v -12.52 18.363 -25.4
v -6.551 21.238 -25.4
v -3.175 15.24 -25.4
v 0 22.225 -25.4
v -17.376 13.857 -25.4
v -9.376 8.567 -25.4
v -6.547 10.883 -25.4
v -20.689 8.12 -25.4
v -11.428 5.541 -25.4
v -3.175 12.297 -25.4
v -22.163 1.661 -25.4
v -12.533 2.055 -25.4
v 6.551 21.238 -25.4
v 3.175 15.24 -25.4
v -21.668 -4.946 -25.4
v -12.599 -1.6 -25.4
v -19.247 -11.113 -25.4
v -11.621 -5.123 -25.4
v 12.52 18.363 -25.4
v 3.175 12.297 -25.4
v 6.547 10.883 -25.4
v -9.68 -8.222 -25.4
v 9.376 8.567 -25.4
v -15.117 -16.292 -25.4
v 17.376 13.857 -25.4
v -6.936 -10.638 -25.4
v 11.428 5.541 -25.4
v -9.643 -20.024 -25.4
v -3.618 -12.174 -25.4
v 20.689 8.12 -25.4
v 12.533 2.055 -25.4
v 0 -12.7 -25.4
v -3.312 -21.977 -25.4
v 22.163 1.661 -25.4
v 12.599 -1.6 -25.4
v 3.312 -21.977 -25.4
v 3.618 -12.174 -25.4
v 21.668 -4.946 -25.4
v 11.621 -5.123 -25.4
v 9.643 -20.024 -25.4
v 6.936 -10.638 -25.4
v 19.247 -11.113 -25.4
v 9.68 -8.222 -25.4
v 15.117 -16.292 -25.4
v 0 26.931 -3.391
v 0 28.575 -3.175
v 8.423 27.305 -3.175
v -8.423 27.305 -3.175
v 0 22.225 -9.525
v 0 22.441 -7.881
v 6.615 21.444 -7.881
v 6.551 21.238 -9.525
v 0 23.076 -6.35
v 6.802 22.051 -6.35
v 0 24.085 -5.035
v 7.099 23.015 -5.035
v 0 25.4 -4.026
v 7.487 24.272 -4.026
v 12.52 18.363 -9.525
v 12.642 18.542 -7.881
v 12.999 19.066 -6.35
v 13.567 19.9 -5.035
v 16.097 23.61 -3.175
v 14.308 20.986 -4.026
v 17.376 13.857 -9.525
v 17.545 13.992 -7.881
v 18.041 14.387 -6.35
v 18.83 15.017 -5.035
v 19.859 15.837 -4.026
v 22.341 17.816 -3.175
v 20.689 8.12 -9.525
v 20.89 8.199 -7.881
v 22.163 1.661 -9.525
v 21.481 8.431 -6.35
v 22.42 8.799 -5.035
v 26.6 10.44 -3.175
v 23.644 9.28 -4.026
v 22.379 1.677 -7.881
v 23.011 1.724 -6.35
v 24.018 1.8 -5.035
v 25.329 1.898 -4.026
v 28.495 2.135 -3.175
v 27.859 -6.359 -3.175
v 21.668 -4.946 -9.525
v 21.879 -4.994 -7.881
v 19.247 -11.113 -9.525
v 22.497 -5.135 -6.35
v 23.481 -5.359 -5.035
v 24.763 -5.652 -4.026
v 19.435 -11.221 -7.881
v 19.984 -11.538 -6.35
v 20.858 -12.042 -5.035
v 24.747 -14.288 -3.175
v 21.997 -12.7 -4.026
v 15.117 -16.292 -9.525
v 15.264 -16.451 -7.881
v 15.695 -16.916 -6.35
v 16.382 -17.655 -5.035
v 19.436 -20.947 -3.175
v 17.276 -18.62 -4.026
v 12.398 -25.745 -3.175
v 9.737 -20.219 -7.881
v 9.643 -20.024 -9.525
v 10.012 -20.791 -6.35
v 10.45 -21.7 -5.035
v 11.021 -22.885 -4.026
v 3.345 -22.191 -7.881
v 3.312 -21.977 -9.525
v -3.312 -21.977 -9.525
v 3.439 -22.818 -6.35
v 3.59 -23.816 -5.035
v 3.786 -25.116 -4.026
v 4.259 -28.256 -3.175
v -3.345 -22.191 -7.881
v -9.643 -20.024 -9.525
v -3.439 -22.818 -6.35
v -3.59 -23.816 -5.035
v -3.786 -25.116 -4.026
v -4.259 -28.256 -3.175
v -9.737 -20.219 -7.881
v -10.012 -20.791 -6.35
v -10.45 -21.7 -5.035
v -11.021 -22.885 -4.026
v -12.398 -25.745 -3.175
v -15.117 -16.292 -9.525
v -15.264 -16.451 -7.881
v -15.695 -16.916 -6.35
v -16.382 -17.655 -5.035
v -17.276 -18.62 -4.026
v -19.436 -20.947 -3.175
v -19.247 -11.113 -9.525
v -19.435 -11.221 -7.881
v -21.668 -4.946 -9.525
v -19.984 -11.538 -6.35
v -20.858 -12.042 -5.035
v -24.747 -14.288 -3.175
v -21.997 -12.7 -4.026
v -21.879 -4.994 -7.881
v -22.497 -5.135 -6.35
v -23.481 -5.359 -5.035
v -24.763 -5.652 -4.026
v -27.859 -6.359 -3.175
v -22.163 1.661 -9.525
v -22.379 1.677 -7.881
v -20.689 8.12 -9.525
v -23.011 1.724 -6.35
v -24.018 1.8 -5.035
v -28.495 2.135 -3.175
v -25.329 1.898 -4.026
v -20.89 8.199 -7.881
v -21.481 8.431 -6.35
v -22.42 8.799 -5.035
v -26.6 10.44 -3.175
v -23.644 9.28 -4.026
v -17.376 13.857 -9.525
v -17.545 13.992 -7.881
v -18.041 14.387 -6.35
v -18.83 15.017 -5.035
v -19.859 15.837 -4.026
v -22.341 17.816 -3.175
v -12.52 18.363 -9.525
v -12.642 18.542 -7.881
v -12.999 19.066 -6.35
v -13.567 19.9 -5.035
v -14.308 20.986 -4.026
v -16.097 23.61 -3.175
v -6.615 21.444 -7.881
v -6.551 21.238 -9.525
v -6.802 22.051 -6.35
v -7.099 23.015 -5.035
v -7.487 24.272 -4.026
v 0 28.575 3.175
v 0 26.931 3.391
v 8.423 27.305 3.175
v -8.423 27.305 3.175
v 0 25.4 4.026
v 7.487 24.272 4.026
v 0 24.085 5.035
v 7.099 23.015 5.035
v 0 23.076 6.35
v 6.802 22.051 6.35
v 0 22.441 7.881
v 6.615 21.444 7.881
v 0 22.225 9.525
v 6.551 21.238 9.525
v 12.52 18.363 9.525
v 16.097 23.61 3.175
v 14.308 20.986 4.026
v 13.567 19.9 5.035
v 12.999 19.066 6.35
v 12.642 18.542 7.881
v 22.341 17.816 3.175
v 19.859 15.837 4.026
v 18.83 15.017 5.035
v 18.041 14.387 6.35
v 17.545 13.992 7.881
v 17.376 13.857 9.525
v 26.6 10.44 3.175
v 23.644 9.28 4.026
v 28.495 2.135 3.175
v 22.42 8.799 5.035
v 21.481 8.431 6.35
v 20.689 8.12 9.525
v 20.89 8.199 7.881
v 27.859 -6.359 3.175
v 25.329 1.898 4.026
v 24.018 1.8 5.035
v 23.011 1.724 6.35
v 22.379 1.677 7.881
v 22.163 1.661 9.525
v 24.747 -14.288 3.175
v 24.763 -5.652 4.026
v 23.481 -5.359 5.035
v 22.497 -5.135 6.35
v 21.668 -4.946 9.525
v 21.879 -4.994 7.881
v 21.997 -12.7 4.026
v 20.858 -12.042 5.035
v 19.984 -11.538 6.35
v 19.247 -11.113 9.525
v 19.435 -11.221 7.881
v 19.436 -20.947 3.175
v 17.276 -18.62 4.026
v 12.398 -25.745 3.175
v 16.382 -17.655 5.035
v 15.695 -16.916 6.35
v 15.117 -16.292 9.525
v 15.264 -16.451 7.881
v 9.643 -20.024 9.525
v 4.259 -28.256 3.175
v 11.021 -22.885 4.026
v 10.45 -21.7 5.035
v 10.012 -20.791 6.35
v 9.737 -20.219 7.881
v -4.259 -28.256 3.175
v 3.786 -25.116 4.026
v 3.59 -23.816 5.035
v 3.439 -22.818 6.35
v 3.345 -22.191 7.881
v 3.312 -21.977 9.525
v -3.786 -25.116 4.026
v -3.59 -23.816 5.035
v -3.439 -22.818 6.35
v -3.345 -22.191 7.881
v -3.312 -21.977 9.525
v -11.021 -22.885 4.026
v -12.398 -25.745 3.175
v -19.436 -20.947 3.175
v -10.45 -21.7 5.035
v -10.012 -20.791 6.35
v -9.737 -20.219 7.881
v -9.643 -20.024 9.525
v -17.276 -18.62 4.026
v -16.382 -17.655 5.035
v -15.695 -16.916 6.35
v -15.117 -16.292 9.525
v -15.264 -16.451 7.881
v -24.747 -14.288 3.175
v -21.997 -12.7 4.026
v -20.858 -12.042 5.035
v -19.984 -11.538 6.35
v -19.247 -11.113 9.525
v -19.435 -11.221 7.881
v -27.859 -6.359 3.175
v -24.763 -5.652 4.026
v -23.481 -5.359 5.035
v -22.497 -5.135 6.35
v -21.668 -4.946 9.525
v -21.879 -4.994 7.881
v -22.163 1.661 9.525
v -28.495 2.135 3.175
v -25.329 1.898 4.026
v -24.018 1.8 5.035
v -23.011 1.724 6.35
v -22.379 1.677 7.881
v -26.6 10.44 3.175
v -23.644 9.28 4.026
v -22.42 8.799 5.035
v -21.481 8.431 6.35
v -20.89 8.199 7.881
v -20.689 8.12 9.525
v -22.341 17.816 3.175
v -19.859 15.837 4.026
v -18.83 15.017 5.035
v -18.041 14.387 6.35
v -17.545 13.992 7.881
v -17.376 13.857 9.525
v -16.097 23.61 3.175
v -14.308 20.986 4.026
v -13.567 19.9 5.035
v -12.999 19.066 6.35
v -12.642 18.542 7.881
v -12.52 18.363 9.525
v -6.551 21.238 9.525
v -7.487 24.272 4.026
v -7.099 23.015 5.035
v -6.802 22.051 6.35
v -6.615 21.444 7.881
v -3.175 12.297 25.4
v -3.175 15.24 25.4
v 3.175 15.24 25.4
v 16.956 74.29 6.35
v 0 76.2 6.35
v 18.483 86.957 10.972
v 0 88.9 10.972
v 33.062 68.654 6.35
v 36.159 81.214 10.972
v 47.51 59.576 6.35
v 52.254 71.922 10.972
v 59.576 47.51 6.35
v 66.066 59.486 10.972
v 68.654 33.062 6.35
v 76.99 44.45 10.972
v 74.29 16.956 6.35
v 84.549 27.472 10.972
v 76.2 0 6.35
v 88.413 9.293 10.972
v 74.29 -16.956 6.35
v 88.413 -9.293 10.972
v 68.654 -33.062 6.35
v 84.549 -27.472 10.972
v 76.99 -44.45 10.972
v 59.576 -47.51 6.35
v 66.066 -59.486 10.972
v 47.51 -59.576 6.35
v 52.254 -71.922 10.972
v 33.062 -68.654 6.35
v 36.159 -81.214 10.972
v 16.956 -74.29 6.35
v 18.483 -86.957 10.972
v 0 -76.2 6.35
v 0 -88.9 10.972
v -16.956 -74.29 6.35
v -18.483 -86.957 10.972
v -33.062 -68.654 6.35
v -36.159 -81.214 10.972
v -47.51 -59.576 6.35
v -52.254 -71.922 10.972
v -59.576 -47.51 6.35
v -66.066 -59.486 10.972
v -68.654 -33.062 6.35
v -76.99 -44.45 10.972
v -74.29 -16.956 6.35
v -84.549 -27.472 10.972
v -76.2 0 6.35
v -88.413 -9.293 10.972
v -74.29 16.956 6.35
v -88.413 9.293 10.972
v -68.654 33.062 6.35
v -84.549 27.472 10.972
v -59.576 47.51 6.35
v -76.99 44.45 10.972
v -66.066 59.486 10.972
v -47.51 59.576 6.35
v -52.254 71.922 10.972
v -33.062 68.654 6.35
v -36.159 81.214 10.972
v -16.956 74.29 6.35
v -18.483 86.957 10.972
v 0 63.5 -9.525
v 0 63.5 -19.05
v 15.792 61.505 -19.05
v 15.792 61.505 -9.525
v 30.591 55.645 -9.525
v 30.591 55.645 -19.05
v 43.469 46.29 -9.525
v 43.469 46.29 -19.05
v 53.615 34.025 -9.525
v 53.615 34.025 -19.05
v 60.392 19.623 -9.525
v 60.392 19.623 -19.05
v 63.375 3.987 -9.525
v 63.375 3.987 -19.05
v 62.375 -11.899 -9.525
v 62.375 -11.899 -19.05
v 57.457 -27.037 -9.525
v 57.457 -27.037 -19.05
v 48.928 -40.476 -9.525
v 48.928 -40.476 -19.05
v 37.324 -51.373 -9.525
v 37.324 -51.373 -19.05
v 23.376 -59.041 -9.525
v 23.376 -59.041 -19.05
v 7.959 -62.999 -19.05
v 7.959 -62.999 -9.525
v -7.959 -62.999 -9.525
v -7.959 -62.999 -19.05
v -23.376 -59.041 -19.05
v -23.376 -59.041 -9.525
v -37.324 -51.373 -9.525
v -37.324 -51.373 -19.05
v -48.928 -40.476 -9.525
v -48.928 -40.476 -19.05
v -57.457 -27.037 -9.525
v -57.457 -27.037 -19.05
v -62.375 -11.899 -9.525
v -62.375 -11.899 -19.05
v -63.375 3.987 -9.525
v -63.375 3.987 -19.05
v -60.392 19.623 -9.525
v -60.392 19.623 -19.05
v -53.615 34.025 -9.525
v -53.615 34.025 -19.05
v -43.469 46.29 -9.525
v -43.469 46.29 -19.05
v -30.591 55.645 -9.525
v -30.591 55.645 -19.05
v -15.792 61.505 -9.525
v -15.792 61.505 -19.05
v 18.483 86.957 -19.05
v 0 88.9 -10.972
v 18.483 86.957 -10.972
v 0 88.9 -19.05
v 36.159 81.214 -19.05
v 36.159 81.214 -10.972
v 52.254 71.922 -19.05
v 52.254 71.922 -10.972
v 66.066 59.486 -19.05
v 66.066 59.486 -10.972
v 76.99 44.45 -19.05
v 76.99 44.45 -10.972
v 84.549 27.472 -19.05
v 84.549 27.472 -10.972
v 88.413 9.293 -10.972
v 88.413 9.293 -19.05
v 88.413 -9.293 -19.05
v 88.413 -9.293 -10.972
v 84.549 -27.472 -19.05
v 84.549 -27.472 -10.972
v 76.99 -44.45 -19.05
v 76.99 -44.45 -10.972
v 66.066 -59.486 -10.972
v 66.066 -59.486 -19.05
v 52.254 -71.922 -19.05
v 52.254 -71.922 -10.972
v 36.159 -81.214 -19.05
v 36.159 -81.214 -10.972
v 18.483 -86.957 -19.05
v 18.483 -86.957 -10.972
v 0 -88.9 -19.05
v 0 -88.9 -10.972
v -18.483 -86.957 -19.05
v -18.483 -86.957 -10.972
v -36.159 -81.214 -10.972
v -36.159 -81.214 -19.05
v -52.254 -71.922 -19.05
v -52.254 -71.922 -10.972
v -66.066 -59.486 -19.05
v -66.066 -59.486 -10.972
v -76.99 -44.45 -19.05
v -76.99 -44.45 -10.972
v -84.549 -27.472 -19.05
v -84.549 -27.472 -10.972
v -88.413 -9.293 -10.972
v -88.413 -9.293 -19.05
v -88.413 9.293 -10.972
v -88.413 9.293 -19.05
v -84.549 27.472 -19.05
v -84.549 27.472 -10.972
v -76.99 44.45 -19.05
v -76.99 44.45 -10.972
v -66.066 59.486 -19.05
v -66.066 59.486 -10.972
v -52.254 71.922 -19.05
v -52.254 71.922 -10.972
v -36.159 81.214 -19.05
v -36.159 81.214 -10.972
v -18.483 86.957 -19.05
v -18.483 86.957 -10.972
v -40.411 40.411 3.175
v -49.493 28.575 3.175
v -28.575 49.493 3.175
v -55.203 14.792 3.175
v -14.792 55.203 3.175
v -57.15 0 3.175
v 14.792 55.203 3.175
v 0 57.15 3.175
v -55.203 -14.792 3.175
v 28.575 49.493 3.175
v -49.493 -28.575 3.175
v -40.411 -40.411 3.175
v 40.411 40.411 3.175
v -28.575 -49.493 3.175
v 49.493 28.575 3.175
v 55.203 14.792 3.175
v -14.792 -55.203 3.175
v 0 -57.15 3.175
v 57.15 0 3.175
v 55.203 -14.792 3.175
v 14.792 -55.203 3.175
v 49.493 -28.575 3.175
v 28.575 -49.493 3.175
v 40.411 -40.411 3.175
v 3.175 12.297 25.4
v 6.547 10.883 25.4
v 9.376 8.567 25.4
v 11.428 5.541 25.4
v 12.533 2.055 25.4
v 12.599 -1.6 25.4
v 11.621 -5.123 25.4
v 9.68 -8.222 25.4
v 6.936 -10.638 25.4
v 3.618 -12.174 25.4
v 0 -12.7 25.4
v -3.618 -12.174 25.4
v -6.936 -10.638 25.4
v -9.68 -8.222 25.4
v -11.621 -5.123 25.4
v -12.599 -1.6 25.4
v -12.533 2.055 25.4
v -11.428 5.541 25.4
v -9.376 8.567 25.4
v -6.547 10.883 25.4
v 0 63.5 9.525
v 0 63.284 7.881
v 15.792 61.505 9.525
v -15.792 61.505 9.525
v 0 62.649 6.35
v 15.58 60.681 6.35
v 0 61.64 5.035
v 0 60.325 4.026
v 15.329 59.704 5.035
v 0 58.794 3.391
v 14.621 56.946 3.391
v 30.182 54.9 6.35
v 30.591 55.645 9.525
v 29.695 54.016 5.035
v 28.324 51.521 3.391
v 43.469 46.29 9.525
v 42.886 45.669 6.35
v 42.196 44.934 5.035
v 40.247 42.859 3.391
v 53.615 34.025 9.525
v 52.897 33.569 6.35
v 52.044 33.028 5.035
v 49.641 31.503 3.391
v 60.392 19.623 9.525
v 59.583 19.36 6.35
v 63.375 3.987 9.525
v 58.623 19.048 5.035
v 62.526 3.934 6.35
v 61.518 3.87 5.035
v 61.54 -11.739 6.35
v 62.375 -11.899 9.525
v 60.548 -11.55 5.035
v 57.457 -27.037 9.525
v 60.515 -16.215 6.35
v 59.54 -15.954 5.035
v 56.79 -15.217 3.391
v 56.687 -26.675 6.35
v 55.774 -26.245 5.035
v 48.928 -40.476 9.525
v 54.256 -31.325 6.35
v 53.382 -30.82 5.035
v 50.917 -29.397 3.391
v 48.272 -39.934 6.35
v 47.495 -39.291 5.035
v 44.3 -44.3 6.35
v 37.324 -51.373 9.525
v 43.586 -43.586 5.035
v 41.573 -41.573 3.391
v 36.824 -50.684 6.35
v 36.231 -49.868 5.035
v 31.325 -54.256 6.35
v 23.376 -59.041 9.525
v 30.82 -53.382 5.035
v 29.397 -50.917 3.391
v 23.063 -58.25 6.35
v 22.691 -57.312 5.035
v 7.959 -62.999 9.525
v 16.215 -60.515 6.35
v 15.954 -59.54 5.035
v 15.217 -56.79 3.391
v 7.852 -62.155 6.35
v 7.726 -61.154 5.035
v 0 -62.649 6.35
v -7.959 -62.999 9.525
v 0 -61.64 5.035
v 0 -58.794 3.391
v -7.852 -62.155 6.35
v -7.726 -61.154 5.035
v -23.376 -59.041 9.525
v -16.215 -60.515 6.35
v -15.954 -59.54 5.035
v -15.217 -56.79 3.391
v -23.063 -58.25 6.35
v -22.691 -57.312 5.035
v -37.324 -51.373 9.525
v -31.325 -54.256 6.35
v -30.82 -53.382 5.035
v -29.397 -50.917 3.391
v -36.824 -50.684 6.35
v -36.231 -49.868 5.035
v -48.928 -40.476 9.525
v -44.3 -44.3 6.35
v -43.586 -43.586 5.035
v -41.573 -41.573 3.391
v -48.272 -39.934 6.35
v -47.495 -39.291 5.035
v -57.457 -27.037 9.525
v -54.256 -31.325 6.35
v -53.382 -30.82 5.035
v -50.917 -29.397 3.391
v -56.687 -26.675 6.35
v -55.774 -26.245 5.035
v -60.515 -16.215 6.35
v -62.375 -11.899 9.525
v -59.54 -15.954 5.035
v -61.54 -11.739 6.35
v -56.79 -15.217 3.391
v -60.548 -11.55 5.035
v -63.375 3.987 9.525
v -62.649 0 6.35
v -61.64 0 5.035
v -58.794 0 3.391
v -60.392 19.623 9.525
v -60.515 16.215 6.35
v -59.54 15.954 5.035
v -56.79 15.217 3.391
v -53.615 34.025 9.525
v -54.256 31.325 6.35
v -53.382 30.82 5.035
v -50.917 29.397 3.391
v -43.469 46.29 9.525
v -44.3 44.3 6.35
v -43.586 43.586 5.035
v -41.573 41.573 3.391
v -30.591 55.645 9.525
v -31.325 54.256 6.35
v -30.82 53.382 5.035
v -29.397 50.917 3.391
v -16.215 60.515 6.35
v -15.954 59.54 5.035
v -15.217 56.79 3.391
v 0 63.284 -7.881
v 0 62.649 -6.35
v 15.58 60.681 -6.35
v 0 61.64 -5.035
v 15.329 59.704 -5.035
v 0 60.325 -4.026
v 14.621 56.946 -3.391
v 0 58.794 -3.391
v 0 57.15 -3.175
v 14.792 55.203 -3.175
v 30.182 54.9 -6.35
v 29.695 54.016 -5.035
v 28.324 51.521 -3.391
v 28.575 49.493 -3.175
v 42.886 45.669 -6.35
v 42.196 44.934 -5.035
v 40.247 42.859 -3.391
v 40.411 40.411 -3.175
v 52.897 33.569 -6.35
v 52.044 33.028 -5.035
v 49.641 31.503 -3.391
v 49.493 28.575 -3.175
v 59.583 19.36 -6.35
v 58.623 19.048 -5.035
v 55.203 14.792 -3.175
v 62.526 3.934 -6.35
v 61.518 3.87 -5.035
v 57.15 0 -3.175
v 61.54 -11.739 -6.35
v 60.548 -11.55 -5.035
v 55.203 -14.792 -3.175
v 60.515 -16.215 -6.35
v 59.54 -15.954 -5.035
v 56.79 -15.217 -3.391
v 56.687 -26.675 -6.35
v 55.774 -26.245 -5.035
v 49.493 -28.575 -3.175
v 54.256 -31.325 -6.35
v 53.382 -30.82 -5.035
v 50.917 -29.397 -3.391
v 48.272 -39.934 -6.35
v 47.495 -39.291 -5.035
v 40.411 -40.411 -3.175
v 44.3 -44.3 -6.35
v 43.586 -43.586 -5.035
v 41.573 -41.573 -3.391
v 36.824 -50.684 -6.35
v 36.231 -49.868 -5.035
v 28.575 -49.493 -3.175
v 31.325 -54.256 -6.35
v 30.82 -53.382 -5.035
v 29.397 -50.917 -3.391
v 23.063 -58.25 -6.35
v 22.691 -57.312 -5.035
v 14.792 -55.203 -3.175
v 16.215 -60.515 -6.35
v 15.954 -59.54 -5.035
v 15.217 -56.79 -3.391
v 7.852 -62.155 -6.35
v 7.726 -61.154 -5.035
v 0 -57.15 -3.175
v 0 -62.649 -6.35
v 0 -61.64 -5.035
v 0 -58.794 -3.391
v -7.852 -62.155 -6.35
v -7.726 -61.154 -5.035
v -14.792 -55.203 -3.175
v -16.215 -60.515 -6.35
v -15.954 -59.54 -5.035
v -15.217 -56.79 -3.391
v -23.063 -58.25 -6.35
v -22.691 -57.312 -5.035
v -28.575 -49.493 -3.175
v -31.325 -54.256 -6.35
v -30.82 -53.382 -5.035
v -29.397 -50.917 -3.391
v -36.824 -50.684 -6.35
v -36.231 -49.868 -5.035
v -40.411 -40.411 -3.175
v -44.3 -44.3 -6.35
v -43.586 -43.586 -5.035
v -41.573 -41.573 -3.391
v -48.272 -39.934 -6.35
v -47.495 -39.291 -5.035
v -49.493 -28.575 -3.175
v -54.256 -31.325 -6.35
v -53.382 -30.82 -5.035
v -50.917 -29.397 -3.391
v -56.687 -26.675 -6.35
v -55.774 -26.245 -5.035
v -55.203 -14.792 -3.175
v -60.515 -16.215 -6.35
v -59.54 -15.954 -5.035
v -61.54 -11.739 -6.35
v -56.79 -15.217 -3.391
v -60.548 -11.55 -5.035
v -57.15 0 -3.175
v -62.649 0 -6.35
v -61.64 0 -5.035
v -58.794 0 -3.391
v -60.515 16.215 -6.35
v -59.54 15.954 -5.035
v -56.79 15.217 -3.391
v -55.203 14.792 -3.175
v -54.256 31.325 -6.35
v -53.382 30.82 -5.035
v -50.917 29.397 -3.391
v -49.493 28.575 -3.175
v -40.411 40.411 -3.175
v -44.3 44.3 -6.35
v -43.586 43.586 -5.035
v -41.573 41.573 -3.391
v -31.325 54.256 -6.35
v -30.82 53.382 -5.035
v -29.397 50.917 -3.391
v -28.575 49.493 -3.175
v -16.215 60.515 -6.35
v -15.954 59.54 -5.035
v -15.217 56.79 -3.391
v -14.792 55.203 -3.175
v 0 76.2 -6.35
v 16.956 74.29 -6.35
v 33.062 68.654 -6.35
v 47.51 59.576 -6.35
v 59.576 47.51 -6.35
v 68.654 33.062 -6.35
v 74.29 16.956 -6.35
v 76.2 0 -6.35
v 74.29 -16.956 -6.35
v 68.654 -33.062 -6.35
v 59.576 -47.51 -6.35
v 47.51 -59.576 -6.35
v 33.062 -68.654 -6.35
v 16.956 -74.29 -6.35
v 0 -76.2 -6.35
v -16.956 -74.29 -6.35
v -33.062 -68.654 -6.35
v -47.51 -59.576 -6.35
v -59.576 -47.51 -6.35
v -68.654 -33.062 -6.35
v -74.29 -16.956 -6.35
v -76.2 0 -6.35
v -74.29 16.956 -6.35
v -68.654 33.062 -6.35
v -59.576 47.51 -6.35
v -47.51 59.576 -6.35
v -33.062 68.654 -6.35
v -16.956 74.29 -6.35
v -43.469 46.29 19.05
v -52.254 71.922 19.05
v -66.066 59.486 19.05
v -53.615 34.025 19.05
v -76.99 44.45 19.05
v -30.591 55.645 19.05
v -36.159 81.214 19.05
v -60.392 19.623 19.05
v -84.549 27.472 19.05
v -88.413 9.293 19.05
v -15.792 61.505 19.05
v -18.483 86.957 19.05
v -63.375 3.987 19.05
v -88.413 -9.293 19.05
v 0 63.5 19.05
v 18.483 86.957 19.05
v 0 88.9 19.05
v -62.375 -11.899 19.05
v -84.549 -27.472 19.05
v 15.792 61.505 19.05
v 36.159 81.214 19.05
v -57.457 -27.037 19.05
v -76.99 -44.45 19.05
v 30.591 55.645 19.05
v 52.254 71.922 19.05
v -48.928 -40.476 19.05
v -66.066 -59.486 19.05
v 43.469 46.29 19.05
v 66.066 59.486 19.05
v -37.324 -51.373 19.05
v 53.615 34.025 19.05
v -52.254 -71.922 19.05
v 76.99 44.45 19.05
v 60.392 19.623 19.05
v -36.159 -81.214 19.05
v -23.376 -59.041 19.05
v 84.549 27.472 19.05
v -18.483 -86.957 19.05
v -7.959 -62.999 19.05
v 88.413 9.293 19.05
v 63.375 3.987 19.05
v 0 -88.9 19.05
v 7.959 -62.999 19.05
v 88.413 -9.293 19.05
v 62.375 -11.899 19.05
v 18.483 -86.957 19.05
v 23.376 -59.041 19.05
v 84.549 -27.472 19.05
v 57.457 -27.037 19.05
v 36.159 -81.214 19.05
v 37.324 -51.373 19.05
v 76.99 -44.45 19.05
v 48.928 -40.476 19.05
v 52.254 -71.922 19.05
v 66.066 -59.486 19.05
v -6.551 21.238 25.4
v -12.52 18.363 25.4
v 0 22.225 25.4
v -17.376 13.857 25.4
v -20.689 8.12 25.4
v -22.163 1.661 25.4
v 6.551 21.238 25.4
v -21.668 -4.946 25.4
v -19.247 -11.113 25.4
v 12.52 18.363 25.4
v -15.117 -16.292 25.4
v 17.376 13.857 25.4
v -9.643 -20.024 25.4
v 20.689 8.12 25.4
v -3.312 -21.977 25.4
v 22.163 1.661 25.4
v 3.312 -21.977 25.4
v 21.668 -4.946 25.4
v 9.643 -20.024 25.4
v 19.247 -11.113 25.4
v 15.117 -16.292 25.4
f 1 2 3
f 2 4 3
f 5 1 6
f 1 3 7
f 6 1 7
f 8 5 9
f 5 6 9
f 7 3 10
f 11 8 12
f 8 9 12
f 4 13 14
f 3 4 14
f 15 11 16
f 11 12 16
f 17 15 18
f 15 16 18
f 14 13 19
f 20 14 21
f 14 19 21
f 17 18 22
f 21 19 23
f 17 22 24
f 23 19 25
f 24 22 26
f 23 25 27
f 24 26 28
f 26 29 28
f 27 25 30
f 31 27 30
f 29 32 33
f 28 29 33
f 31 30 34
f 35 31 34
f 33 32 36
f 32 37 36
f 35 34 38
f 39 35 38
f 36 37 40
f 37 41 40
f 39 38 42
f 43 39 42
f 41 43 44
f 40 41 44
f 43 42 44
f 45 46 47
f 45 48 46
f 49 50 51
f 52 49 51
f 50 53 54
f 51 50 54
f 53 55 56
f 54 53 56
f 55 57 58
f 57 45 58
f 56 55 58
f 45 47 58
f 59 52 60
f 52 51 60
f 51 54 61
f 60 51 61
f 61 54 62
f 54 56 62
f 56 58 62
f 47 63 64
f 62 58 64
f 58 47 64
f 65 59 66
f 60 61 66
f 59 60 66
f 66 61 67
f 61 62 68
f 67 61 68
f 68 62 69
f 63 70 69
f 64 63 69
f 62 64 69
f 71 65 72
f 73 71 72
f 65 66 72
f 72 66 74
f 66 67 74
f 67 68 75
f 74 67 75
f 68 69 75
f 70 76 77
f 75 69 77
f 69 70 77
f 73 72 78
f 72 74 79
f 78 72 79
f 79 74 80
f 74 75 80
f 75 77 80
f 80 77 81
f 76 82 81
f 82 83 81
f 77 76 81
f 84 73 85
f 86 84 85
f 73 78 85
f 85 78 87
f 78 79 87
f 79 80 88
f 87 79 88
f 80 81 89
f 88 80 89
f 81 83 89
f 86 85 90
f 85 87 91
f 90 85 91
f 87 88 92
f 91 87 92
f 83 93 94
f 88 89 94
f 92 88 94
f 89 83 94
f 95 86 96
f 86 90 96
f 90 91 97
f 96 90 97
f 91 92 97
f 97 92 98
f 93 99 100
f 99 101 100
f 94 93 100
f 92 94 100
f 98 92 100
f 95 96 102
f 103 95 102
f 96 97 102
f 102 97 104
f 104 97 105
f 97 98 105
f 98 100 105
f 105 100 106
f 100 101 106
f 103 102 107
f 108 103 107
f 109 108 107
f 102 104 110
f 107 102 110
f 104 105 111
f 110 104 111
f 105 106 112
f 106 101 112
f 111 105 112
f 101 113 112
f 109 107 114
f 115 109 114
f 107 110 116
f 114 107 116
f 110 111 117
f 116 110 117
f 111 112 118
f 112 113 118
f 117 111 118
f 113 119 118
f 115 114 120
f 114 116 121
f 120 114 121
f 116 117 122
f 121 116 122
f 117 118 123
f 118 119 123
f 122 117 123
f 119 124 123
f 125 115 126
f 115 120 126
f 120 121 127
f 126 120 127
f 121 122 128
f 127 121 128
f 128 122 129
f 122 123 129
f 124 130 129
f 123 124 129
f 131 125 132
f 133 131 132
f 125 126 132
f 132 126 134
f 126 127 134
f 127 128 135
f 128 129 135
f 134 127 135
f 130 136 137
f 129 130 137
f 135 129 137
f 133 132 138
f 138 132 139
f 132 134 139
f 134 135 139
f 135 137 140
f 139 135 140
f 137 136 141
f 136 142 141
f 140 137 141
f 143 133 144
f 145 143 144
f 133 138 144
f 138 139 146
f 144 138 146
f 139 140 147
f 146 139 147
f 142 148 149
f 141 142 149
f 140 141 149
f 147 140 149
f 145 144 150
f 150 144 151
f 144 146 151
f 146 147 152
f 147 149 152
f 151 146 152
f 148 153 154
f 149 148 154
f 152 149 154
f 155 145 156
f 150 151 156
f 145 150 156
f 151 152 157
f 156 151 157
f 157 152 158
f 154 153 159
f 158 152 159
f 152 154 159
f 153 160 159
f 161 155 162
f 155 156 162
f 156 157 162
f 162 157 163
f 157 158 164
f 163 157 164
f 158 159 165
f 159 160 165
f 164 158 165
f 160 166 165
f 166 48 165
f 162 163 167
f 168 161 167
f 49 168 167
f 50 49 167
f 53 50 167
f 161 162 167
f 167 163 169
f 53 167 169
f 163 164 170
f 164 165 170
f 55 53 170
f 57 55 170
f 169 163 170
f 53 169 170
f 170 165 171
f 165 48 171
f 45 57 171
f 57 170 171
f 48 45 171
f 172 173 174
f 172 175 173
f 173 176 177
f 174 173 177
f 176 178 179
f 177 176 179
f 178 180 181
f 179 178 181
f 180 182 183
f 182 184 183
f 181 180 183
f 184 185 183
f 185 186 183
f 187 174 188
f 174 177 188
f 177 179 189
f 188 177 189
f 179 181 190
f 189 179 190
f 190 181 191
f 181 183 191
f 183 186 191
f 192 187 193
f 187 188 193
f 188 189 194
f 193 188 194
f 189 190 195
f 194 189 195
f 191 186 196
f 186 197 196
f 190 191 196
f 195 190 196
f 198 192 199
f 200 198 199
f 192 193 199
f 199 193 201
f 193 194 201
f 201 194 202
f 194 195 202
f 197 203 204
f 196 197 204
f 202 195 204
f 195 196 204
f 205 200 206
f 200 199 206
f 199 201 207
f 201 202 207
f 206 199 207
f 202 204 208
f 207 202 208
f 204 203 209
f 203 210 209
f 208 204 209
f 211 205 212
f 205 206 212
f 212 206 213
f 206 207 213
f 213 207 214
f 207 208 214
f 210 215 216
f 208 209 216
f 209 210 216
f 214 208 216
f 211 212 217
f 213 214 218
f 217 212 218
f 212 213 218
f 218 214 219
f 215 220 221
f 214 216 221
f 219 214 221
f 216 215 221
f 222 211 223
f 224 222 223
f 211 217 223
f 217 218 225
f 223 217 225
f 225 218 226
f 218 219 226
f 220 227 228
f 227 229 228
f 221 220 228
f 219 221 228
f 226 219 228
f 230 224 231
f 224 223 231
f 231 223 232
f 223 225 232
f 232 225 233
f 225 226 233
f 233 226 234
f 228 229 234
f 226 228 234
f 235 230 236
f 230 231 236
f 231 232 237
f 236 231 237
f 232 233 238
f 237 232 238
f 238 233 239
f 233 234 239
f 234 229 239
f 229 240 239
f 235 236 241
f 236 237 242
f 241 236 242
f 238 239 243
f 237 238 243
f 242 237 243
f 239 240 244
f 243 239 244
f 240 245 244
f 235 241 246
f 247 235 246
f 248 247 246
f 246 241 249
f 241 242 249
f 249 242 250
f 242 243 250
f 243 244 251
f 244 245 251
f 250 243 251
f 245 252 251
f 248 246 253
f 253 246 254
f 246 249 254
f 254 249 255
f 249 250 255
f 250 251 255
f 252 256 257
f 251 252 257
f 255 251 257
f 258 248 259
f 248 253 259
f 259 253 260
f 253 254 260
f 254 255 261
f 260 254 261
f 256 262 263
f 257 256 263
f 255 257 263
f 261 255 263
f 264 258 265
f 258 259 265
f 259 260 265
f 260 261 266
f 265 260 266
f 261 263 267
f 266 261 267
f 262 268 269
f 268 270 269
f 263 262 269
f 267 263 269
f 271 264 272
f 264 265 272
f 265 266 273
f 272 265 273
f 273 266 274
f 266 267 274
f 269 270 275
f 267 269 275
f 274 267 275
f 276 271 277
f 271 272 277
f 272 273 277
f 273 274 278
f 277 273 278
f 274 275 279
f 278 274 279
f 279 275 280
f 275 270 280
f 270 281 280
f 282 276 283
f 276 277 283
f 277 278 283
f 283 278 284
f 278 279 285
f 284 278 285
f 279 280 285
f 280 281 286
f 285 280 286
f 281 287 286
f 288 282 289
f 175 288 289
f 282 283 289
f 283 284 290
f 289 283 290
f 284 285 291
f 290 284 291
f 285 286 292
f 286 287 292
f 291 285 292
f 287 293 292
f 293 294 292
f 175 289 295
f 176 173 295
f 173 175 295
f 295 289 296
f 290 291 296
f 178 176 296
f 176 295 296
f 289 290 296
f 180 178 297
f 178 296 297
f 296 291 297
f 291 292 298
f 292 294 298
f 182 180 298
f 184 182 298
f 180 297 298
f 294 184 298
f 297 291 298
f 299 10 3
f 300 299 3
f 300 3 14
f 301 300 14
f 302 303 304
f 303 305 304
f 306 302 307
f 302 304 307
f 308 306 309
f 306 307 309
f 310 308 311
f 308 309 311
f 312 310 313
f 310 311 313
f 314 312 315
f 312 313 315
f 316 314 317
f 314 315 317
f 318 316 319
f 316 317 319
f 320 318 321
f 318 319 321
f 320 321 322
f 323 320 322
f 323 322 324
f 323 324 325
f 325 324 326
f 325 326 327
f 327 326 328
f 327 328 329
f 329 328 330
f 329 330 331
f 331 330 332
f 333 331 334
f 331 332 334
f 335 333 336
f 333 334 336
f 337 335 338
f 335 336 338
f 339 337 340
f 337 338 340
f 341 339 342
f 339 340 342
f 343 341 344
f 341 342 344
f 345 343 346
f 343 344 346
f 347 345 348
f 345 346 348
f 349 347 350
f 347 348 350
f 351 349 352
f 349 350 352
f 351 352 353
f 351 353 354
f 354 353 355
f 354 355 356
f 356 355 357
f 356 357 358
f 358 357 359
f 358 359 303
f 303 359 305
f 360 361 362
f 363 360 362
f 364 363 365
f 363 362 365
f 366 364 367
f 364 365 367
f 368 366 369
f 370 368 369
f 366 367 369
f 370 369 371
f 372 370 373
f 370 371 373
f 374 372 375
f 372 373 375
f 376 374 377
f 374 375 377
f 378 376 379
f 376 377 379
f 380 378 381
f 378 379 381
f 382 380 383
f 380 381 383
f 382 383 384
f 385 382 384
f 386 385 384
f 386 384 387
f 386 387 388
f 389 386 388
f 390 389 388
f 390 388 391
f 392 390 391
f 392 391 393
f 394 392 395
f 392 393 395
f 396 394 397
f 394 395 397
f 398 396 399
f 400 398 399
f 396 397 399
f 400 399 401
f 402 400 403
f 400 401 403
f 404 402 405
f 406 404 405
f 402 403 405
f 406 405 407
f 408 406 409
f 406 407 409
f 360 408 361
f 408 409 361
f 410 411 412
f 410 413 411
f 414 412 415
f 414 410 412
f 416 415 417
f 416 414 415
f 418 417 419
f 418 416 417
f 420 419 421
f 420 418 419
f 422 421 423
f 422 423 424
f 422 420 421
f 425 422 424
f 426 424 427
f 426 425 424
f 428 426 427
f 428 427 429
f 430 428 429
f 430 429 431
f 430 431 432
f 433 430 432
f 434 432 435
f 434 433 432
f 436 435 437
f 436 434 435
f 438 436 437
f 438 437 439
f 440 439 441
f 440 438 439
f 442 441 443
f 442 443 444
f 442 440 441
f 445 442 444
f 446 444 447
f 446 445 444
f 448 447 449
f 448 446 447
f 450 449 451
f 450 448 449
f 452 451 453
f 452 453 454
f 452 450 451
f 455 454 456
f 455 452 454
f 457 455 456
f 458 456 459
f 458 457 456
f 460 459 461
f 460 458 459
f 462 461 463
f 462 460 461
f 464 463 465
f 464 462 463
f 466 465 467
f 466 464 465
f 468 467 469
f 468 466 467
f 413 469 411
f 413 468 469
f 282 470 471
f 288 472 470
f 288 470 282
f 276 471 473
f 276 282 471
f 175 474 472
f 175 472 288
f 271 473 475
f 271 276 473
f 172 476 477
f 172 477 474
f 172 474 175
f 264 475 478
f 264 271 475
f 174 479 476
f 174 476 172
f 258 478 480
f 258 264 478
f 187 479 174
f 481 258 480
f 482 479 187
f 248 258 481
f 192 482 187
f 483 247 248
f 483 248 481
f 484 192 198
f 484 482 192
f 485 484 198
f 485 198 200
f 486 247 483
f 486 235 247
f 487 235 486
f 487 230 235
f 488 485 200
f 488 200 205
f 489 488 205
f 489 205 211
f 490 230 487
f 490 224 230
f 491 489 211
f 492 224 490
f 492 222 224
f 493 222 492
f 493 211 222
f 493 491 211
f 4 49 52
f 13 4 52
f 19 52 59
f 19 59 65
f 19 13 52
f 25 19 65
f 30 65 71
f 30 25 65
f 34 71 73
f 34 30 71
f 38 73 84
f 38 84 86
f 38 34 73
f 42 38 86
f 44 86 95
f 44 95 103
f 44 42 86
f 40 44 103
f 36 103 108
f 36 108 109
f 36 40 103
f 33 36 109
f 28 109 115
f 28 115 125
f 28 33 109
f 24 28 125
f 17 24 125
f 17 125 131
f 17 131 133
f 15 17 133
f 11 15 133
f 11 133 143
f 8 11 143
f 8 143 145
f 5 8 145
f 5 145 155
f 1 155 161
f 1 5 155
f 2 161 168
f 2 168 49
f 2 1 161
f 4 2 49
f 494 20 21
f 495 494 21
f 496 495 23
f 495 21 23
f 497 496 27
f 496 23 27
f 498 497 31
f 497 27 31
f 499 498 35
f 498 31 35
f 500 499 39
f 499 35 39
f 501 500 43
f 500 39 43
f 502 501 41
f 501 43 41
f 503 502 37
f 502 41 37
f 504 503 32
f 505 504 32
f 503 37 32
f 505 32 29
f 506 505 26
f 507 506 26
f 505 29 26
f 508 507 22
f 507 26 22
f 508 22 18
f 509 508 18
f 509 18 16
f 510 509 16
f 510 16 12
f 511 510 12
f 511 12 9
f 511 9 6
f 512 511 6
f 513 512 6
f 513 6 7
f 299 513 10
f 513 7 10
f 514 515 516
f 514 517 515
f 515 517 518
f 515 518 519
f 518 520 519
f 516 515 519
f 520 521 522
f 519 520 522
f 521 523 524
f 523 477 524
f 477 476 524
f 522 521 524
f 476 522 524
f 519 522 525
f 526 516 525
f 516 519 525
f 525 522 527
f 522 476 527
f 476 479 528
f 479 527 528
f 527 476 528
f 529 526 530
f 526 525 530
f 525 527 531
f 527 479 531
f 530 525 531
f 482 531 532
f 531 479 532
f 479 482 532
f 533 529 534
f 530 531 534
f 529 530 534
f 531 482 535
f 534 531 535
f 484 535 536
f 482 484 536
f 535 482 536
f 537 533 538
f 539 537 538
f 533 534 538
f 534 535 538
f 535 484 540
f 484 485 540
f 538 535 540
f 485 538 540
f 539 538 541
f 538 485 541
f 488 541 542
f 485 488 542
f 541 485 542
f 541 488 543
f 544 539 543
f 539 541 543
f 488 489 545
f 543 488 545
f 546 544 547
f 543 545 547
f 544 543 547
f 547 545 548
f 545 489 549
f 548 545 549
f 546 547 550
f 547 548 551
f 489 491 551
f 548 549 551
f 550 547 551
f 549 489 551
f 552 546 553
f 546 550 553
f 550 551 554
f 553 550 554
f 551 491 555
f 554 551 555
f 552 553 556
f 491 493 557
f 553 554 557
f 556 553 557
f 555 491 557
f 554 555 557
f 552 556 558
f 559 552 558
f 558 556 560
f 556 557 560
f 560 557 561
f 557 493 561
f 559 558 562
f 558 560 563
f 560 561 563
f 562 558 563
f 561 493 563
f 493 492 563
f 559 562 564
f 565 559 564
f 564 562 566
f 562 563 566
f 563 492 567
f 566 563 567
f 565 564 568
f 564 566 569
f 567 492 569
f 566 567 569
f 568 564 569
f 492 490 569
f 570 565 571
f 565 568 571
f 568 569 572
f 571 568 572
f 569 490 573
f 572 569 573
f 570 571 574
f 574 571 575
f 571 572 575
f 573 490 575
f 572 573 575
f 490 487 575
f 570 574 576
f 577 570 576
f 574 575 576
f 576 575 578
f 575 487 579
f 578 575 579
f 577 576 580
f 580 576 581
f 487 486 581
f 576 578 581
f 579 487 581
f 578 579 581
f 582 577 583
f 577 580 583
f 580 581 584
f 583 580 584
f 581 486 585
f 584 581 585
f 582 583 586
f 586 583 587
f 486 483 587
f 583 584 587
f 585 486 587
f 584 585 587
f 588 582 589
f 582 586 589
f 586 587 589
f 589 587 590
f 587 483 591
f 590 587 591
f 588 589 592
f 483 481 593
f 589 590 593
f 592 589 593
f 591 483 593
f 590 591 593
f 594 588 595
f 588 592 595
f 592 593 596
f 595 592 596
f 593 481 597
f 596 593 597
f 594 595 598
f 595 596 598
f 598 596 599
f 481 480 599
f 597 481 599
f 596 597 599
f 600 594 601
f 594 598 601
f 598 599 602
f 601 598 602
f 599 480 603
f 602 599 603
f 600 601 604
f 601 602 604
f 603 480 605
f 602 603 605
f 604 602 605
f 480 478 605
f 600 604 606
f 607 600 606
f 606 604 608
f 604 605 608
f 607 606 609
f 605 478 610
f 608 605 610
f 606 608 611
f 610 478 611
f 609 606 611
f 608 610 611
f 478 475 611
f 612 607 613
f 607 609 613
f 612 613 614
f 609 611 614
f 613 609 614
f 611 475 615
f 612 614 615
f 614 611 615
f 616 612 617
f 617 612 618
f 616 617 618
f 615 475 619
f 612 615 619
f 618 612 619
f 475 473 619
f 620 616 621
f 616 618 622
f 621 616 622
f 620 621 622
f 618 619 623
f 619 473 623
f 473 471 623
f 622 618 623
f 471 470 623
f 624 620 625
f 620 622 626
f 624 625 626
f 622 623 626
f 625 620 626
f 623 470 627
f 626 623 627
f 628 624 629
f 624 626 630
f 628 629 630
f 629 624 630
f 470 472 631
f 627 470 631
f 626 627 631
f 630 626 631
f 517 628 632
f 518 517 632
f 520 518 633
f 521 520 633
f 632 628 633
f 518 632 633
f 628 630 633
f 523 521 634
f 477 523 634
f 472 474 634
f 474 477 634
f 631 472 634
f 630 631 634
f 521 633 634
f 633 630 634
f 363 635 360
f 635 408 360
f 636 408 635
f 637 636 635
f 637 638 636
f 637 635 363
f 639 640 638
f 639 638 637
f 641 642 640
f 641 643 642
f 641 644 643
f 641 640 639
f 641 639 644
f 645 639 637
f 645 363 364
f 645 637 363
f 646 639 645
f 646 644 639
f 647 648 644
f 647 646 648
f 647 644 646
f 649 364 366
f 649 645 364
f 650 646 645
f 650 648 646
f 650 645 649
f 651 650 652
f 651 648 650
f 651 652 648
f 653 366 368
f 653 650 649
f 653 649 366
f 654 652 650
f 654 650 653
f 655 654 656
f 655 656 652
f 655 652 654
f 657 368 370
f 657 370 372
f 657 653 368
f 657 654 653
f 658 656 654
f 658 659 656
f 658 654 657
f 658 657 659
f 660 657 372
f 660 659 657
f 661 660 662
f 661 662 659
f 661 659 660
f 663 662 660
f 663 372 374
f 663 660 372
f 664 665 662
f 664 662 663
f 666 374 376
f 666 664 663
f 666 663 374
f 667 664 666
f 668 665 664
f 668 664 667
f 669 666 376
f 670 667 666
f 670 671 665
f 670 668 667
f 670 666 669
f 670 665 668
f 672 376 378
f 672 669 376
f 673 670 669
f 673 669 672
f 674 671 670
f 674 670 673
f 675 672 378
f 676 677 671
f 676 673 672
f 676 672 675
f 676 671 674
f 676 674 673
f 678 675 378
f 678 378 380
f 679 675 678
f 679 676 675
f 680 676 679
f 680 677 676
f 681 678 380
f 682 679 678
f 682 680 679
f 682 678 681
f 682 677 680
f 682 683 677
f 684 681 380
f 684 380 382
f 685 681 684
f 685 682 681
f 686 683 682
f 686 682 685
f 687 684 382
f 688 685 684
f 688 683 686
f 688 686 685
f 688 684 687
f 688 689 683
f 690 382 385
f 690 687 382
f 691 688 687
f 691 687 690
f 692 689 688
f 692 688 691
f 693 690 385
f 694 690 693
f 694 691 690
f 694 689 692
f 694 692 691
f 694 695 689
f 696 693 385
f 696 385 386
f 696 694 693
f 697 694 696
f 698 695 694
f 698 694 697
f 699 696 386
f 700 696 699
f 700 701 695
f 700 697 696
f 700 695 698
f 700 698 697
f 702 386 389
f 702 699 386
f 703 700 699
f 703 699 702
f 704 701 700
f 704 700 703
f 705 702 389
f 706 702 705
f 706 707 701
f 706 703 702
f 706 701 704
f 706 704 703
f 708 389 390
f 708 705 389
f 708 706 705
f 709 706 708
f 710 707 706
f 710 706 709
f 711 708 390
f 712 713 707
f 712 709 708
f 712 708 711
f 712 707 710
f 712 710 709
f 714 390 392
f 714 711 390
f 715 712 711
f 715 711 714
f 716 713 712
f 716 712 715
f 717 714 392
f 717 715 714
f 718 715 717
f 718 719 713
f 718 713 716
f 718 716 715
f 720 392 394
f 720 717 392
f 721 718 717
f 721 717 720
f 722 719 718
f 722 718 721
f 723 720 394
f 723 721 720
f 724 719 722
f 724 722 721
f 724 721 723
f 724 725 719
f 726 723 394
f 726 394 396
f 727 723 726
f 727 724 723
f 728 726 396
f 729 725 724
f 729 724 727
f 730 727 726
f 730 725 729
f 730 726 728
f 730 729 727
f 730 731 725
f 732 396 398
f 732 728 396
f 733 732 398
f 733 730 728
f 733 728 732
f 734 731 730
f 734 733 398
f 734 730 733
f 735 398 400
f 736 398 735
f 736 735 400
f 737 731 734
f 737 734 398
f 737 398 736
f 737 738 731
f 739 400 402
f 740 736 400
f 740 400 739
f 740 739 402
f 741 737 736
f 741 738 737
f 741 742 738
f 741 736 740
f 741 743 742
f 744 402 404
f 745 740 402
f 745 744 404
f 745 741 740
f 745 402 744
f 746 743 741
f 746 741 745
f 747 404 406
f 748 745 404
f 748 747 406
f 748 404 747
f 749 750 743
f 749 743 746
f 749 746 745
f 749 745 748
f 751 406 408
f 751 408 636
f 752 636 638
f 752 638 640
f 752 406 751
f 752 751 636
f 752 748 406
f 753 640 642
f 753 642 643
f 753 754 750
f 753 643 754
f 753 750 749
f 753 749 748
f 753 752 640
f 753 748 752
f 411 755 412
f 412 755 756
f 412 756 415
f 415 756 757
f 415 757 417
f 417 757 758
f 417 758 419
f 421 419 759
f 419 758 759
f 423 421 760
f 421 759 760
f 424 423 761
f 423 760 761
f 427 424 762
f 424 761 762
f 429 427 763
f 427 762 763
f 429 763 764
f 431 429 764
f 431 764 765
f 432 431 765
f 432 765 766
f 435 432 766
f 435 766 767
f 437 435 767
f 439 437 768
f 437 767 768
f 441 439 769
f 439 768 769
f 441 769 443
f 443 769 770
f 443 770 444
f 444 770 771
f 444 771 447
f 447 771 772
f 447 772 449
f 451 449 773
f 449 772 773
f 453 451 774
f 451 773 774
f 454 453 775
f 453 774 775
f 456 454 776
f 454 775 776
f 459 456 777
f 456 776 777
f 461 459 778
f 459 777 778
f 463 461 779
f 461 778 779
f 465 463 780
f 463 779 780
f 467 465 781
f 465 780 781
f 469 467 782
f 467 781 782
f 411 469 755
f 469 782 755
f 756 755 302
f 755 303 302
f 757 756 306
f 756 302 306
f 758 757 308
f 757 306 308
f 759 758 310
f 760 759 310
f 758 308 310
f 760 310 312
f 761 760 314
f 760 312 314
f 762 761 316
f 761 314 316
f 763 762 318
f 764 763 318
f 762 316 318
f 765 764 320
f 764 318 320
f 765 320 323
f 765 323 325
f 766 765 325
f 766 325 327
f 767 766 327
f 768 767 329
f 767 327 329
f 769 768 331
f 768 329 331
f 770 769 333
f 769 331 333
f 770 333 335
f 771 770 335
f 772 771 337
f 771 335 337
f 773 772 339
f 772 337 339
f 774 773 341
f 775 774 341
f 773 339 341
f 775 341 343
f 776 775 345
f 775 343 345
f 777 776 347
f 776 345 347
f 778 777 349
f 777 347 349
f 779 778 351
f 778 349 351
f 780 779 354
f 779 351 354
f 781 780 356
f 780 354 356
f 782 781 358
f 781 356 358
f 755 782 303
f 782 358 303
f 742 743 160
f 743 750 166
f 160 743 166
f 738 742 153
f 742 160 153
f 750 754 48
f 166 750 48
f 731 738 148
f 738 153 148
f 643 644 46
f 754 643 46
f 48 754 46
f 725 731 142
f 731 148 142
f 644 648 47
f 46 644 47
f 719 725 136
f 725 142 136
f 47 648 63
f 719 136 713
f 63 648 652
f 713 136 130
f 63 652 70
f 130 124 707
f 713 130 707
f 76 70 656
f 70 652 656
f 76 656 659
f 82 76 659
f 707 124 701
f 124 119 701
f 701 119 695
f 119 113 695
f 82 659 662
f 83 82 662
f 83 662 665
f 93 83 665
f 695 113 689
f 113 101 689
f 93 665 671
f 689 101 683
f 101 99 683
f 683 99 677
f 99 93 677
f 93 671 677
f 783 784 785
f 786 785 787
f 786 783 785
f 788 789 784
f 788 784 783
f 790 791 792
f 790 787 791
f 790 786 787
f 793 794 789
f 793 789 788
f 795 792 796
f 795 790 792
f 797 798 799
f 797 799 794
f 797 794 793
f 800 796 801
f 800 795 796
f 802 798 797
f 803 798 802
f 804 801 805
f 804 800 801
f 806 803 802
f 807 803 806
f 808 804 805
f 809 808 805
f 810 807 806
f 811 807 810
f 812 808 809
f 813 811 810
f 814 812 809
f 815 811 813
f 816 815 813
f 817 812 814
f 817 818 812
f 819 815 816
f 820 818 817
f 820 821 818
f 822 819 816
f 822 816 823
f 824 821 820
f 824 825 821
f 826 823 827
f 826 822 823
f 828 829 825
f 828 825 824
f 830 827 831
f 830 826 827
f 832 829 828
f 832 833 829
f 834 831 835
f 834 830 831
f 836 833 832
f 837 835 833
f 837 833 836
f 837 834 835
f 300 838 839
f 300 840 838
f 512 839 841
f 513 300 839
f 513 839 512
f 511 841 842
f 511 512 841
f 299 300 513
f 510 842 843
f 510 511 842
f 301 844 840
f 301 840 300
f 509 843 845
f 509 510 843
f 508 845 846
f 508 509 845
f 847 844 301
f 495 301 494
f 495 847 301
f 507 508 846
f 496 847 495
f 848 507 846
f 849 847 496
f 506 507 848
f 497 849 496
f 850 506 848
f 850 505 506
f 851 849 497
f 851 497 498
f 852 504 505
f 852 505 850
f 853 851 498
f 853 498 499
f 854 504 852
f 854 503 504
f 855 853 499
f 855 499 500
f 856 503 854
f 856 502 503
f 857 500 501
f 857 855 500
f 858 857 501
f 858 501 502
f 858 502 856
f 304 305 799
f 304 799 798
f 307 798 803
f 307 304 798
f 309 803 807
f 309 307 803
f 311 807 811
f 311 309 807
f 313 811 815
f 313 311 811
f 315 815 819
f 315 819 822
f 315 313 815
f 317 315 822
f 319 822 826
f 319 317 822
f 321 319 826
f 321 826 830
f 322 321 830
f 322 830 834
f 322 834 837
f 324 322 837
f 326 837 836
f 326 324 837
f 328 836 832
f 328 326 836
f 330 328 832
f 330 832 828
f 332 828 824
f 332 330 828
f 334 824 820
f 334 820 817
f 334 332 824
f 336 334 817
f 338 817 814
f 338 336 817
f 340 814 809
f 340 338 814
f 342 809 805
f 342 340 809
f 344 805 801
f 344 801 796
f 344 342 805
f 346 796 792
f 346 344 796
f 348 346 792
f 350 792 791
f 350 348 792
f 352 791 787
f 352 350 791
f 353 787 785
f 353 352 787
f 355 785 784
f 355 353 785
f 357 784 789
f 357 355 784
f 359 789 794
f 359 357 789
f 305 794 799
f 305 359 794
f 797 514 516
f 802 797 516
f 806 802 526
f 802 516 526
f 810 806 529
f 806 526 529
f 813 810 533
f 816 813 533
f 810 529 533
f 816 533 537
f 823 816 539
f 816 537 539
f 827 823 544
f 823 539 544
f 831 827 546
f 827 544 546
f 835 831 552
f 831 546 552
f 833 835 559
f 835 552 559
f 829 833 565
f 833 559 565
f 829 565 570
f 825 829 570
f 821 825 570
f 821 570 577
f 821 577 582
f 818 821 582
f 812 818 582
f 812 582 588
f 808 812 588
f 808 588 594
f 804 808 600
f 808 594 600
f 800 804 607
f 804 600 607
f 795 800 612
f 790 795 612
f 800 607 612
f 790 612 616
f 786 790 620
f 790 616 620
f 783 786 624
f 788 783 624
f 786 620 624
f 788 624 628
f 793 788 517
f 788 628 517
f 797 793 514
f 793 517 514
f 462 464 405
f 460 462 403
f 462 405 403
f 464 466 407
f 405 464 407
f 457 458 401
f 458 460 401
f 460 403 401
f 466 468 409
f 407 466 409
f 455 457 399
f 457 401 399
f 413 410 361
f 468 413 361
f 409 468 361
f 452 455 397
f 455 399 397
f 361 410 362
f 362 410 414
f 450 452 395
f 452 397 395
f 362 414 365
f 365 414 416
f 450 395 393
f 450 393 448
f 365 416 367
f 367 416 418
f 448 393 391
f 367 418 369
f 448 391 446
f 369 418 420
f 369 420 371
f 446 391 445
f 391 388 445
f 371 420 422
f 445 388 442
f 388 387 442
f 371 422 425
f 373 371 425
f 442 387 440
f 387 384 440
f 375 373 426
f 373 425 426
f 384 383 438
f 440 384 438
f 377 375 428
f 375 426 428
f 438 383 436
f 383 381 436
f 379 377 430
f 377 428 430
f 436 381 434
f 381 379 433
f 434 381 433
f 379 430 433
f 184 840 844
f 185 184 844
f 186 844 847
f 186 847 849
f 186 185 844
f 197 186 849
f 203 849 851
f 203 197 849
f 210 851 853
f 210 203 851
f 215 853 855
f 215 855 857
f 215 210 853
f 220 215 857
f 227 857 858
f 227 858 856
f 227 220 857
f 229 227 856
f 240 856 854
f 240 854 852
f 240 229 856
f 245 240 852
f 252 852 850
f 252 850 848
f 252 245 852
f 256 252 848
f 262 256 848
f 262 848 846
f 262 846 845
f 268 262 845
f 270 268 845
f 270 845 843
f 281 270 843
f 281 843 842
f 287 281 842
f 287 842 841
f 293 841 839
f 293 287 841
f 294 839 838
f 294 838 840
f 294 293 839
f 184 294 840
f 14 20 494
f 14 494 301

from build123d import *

# Parameters (mm, degrees)
SKETCH1_W          = 38.1
SKETCH1_H          = 25.4
SKETCH1_W_2        = 50.8
SKETCH1_H_2        = 9.525
SKETCH1_W_3        = 6.35
SKETCH1_H_3        = 41.275
FILLET1_R          = 6.35
SKETCH4_W          = 6.35
SKETCH4_H          = 15.24
CUT_EXTRUDE1_DEPTH = 51.8


with BuildPart() as part:
    # Sketch1 → Revolve1 (revolve)
    with BuildSketch(Plane(origin=(0, 0, 0), x_dir=(0, 0, -1), z_dir=(1, 0, 0))):
        with Locations((0, 76.2)):
            Rectangle(SKETCH1_W, SKETCH1_H)
        with Locations((0, 17.4625)):
            Rectangle(SKETCH1_W_2, SKETCH1_H_2)
        with Locations((0, 42.8625)):
            Rectangle(SKETCH1_W_3, SKETCH1_H_3)
    revolve(axis=Axis((0, 0, 0), (0, 0, -1)))

    # Sketch3 → Cut-Revolve1 (revolve, cut)
    with BuildSketch(Plane(origin=(0, 0, 0), x_dir=(0, 0, -1), z_dir=(1, 0, 0))):
        Polygon((-10.972421975, 88.9), (10.972421975, 88.9), (6.35, 76.2), (-6.35, 76.2), align=None)
    revolve(axis=Axis((0, 0, 0), (0, 0, -1)), mode=Mode.SUBTRACT)

    # Fillet1
    fillet1_edges = [part.edges().sort_by_distance(p)[0] for p in [
        (0, -63.5, -3.175),
        (0, -22.225, -3.175),
        (0, -22.225, 3.175),
        (0, -63.5, 3.175),
    ]]
    fillet(fillet1_edges, radius=FILLET1_R)

    # Sketch4 → Cut-Extrude1 (cut, through all)
    with BuildSketch(Plane.XY.offset(25.4)):
        with Locations((0, 7.62)):
            Rectangle(SKETCH4_W, SKETCH4_H)
    extrude(amount=-CUT_EXTRUDE1_DEPTH, mode=Mode.SUBTRACT)


solid = part.part
